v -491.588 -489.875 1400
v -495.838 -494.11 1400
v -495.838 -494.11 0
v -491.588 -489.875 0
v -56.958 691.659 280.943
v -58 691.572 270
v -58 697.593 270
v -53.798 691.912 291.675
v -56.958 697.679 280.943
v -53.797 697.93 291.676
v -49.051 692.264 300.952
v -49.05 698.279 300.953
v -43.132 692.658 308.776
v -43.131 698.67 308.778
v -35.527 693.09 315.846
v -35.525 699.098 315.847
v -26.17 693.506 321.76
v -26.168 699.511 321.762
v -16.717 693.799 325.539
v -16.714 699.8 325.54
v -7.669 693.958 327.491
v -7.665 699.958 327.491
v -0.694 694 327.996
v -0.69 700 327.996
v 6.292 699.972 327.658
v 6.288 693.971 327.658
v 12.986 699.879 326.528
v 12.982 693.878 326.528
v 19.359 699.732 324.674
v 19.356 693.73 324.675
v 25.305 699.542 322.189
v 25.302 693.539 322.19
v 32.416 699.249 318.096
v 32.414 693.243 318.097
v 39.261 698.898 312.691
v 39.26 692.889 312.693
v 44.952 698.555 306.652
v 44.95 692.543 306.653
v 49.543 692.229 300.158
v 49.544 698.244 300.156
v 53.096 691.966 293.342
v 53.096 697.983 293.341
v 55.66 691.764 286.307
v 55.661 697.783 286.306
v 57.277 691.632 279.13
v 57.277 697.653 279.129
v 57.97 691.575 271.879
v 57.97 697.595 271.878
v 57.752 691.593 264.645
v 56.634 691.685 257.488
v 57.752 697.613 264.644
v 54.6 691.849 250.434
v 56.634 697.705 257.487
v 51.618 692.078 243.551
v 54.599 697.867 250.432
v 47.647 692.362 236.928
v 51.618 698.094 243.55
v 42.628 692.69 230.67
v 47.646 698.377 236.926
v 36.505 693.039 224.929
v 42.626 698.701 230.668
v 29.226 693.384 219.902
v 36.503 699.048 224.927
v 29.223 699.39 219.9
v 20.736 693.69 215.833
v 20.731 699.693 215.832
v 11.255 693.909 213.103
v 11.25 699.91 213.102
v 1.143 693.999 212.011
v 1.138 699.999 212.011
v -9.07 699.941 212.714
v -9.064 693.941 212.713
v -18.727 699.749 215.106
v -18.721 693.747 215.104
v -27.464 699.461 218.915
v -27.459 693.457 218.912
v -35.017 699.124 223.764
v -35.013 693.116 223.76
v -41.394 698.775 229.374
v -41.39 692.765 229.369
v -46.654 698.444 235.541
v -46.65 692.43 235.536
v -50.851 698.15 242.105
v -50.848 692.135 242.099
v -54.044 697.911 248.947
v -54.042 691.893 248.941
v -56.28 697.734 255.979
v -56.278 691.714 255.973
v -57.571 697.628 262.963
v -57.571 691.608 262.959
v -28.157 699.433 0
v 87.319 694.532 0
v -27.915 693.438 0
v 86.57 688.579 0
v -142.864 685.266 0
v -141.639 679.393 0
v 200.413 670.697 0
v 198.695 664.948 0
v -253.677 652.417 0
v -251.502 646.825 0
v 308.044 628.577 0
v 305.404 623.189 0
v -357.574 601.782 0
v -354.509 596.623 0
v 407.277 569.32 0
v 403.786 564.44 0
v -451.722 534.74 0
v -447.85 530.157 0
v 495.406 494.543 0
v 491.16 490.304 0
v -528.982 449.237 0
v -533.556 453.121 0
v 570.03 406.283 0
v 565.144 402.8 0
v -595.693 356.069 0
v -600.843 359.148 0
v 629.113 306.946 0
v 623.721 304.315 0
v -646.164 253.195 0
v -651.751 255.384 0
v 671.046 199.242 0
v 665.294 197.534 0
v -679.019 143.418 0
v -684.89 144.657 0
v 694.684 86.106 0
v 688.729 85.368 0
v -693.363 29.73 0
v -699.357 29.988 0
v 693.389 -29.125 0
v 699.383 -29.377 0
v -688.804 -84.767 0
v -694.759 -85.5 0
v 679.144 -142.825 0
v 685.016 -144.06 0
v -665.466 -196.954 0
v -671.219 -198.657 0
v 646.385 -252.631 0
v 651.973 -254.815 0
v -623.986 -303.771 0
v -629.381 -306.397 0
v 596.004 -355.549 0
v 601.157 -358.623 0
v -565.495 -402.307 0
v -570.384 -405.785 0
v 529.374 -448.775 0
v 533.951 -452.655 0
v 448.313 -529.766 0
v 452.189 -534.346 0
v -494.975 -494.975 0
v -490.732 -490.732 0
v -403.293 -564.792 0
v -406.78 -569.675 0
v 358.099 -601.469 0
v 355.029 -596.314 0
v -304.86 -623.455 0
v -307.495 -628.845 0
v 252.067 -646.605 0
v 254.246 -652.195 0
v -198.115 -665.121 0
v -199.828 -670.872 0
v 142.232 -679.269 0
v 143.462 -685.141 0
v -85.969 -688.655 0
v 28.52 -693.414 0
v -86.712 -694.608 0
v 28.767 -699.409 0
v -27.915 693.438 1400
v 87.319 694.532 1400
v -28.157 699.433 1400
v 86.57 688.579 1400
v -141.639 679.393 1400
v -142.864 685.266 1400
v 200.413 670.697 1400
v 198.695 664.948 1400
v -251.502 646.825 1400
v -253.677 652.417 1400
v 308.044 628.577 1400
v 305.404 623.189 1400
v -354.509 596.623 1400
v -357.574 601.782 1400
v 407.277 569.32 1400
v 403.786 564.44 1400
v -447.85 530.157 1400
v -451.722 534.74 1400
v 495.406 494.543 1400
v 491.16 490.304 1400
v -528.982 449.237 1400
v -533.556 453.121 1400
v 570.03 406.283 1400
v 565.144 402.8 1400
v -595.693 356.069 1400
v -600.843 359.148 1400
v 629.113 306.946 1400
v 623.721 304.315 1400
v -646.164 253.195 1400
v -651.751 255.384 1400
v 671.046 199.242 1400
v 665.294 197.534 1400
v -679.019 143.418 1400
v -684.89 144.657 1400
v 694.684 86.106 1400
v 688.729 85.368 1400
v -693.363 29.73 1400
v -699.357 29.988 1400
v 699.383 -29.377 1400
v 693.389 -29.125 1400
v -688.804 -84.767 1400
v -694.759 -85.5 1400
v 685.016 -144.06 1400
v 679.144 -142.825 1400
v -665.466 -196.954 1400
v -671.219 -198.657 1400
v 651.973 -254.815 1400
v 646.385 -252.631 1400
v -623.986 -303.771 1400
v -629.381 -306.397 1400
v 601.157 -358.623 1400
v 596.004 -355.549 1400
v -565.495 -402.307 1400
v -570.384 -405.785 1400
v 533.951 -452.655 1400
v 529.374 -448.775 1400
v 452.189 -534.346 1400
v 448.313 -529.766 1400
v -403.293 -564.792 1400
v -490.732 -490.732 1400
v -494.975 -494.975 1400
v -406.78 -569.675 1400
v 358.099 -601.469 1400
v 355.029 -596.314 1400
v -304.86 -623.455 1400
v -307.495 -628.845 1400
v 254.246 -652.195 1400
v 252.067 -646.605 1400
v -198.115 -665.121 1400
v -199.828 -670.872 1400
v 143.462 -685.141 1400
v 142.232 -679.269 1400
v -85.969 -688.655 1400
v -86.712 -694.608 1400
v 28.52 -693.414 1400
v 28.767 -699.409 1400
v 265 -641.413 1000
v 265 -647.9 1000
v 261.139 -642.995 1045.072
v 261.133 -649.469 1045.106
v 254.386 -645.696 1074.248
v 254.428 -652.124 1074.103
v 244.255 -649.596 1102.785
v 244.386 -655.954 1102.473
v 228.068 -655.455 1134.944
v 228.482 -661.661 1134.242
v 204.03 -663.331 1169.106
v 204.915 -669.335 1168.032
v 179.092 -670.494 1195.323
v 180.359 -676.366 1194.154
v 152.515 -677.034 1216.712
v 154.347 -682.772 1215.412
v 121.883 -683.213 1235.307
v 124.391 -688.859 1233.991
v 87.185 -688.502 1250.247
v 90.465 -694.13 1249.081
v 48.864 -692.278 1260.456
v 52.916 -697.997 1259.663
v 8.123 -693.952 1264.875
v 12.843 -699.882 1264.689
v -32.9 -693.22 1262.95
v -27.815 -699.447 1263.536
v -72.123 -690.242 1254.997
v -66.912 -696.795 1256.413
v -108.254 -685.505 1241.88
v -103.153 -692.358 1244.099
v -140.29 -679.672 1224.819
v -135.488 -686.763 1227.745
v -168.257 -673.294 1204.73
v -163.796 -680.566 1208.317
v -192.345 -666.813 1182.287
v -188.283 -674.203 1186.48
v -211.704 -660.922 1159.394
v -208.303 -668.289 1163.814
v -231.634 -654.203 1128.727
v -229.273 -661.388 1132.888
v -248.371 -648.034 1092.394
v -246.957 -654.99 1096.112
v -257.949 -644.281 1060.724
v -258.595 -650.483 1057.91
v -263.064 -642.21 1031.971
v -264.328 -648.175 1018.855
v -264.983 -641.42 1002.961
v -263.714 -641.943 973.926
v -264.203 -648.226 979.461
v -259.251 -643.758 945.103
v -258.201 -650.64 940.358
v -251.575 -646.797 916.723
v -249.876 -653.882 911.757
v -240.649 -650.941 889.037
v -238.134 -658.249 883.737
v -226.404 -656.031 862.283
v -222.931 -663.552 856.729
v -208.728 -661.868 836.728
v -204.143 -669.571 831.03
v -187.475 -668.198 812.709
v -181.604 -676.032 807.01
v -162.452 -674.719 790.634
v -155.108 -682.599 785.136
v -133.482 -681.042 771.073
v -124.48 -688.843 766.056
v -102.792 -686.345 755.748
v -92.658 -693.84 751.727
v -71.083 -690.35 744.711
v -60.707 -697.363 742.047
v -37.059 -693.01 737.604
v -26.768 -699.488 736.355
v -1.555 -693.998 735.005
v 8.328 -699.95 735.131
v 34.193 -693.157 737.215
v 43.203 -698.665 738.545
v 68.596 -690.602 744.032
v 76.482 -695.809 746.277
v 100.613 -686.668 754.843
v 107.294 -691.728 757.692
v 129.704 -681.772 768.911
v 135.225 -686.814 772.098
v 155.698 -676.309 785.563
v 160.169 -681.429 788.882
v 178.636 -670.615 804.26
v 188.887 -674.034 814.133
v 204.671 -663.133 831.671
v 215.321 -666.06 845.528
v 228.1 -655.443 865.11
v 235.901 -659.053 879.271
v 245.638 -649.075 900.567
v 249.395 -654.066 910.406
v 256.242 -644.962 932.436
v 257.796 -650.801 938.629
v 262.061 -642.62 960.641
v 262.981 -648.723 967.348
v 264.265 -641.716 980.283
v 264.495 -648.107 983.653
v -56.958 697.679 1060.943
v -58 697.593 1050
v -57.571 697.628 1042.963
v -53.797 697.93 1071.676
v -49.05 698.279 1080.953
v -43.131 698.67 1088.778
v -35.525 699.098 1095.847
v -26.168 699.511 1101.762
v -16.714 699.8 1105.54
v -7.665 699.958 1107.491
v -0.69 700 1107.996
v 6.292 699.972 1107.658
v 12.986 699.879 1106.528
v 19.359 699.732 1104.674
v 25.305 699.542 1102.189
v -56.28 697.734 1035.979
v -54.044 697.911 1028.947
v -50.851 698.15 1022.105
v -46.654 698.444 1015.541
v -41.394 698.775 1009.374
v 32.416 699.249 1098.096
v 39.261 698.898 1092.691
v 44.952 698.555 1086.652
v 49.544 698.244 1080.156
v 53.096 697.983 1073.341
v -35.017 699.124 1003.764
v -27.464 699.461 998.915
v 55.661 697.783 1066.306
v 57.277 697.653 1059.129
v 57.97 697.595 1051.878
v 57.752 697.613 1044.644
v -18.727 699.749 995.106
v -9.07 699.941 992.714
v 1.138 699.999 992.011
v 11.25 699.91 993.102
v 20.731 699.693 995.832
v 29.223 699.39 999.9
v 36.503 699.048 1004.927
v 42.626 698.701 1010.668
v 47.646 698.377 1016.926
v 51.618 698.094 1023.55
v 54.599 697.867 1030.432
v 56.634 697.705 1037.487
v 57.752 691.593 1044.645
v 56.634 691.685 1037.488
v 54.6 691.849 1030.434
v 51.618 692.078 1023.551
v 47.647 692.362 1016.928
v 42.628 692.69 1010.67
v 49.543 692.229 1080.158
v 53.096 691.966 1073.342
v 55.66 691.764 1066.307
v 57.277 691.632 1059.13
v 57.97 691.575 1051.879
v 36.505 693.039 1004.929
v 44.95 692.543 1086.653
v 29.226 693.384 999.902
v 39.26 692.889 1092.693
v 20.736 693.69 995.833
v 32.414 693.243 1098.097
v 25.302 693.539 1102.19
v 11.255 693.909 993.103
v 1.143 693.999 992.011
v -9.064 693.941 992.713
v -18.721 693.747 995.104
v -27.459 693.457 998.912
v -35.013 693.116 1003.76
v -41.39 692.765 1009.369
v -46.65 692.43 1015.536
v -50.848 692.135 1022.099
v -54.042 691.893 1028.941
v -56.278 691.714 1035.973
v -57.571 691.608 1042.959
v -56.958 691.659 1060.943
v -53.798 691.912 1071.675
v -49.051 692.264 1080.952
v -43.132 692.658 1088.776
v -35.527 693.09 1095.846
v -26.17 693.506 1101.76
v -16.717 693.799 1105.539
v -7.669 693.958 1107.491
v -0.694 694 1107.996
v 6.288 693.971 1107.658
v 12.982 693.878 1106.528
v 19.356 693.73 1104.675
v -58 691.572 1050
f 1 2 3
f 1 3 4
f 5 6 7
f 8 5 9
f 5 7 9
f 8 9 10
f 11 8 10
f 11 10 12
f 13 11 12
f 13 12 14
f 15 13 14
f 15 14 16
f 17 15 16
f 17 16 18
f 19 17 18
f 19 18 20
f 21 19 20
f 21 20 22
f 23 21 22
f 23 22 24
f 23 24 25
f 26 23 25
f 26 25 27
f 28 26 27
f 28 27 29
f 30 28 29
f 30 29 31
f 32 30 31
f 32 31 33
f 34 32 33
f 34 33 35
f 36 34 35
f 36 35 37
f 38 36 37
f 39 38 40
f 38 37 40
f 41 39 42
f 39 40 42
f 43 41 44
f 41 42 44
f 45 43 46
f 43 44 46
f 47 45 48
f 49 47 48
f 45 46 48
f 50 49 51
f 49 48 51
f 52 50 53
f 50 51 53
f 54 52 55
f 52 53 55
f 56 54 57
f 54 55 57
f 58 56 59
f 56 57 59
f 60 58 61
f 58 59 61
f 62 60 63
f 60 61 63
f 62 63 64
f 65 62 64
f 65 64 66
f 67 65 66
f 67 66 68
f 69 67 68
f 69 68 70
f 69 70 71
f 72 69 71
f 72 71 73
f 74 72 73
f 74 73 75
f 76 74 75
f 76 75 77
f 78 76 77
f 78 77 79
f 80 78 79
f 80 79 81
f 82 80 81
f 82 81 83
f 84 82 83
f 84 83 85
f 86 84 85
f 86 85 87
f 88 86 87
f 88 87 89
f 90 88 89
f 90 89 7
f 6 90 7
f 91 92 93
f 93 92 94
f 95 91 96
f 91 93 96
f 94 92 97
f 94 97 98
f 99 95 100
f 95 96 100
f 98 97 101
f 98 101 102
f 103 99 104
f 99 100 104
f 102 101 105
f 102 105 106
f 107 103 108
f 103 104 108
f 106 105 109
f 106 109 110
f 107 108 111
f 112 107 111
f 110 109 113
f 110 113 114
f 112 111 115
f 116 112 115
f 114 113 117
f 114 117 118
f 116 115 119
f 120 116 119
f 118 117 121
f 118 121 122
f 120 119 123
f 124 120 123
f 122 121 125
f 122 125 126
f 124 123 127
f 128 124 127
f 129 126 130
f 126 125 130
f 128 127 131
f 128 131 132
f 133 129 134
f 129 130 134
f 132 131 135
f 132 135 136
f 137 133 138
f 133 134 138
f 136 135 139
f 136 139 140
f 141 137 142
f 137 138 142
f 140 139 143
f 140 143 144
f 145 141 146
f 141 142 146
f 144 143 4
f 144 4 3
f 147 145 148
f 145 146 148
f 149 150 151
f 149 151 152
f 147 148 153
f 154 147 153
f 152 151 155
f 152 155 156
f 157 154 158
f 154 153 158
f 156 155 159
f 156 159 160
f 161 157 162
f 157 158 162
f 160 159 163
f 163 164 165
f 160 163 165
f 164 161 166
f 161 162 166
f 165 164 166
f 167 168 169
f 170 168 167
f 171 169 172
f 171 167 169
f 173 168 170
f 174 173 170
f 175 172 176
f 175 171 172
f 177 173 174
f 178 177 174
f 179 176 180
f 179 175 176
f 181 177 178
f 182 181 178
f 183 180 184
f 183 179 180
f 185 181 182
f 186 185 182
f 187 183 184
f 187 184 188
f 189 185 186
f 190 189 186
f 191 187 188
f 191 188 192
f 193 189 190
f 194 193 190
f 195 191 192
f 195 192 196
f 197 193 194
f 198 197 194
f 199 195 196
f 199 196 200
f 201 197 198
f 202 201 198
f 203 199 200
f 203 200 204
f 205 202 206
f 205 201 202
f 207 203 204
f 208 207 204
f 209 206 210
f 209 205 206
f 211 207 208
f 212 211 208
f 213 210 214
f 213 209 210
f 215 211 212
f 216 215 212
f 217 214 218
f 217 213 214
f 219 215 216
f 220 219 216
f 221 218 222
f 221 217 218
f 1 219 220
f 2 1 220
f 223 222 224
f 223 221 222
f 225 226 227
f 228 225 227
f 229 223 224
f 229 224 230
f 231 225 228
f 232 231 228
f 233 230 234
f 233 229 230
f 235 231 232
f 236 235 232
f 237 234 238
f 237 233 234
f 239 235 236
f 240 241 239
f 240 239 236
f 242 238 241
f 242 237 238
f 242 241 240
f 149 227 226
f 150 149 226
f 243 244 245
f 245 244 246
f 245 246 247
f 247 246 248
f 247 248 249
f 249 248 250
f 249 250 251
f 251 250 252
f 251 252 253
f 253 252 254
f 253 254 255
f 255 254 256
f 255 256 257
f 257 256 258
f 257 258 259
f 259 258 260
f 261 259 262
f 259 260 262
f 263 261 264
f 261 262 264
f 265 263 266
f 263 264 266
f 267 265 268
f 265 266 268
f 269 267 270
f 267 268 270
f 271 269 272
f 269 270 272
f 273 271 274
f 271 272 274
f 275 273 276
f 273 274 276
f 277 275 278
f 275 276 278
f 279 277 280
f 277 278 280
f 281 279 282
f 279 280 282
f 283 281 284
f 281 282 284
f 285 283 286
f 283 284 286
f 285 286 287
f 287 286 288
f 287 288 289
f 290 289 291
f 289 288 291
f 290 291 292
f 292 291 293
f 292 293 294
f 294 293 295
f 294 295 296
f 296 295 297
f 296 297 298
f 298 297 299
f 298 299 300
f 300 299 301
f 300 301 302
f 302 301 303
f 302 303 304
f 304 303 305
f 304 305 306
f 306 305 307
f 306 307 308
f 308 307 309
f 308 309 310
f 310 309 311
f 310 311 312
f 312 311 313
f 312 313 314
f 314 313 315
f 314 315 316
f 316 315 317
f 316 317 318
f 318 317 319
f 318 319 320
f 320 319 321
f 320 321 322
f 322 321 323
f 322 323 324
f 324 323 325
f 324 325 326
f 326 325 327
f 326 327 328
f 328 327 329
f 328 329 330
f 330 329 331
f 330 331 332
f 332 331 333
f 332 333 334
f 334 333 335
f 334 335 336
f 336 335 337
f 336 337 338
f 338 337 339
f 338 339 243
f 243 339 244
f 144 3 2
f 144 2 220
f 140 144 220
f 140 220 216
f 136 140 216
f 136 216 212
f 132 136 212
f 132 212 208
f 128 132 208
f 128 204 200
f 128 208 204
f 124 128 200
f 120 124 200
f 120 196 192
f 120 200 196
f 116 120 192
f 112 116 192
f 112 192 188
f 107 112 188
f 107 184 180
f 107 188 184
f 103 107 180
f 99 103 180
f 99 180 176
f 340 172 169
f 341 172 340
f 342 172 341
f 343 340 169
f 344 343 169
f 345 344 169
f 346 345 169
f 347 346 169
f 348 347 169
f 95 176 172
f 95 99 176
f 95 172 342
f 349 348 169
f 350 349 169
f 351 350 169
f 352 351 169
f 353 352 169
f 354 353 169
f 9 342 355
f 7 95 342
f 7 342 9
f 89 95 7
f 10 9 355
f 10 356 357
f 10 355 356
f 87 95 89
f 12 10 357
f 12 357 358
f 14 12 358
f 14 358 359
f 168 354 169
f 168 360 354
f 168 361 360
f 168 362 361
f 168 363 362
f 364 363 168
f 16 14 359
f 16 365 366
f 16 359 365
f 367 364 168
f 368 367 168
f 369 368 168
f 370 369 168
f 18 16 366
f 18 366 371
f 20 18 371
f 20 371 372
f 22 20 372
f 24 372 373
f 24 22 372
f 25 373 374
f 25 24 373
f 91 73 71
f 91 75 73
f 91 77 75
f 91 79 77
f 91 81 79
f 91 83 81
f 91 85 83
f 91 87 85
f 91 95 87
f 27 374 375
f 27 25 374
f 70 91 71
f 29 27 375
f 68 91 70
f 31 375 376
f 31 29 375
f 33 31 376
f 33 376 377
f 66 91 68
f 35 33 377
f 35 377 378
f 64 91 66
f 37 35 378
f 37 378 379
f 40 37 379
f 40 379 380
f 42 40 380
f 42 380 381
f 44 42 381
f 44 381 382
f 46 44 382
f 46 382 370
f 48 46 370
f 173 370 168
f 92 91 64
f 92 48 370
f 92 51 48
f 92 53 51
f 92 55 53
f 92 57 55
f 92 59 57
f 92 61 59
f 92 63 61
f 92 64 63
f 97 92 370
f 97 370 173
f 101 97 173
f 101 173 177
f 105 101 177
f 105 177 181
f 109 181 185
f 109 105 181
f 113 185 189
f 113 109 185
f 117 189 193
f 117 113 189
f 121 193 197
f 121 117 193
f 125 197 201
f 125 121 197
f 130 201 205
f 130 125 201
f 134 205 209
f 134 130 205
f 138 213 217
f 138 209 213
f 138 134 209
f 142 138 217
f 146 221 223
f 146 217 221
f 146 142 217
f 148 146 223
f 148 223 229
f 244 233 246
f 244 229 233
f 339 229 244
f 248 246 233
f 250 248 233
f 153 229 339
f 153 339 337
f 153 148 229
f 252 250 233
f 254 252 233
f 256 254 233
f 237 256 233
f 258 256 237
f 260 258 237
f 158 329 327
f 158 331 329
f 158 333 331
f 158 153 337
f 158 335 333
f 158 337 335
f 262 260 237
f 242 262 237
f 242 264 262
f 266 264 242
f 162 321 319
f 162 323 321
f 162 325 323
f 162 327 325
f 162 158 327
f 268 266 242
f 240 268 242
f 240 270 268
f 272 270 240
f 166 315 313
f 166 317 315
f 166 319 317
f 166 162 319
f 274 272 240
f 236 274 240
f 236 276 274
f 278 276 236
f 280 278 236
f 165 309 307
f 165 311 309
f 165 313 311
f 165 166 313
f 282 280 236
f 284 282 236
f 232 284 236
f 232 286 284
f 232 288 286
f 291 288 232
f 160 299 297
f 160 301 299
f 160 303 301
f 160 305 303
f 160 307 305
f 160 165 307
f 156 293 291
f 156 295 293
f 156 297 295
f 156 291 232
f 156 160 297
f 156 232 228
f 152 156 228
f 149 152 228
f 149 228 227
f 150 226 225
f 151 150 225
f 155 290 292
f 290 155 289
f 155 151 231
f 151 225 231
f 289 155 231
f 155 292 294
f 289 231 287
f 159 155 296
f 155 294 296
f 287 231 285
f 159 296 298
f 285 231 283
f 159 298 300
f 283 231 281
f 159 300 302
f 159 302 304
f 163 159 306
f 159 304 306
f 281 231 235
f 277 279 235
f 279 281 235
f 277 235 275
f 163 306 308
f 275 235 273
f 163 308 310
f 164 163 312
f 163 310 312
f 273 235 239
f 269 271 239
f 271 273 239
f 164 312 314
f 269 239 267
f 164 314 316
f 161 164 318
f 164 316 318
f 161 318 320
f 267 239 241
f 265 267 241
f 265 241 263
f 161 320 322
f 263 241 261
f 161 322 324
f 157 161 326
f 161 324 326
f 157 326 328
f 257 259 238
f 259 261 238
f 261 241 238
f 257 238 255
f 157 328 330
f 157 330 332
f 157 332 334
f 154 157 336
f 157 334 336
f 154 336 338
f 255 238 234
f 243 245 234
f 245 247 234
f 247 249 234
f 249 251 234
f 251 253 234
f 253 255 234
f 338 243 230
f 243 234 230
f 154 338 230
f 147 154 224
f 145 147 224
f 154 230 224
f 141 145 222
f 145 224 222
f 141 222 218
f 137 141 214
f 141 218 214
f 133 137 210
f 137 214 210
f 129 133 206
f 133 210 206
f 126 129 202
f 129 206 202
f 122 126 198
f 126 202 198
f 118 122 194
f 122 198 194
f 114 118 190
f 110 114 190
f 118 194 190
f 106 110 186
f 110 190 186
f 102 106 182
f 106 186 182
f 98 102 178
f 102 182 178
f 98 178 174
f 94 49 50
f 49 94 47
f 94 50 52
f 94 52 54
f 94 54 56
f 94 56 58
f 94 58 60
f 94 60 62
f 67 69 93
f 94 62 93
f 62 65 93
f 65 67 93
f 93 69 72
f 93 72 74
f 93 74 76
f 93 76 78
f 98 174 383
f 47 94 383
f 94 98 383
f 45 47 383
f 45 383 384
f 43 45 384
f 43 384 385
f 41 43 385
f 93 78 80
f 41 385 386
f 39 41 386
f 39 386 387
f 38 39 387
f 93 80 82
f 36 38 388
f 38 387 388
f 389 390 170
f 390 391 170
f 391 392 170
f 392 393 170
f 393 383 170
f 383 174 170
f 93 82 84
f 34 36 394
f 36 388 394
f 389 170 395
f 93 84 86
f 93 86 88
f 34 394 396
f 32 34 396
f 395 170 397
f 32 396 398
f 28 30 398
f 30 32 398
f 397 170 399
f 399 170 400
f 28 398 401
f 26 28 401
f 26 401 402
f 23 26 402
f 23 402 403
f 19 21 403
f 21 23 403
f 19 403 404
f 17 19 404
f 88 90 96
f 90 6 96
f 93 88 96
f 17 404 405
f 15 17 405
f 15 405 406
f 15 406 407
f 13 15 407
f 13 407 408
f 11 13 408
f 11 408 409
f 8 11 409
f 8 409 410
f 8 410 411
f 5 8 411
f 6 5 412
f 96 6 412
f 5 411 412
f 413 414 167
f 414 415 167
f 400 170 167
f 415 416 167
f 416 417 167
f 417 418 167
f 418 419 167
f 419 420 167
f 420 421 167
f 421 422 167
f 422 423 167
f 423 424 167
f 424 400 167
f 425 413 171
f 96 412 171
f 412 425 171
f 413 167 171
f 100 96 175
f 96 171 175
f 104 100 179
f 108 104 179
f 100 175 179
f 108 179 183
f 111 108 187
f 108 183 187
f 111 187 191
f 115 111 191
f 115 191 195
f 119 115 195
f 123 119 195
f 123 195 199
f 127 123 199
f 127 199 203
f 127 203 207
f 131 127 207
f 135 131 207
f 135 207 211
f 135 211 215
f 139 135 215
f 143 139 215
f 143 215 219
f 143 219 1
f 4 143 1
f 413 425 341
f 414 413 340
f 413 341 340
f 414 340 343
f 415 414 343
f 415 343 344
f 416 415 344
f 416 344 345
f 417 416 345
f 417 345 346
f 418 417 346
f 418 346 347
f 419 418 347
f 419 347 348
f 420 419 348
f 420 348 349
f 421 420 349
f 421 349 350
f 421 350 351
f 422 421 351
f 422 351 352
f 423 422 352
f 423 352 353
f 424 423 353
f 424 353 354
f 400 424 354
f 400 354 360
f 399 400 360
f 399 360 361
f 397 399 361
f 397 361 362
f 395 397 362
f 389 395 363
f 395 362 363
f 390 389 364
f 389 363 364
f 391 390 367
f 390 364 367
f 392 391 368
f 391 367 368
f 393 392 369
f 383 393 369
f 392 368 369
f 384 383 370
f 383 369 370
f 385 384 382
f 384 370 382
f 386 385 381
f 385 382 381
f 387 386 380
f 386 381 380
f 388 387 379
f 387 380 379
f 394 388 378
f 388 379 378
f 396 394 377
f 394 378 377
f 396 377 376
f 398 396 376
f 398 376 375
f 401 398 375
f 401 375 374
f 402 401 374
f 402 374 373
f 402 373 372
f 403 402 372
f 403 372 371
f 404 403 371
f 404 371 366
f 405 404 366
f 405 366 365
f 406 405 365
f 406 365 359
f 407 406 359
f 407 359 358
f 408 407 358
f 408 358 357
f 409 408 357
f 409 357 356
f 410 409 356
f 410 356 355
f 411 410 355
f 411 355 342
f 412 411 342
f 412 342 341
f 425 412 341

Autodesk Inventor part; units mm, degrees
sketch "floor angle sketch" plane through (0, 0, 0) normal (0, 0, 1) x (1, 0, 0)
  line L0 (0, 0) -> (0, -240.1382) construction
  line L1 (0, 0) -> (0, -1100)
  line L2 (-494.9747, -494.9747) -> (494.9747, 494.9747) construction
  circle A0 centre (0, 0) radius 700 construction
  line L3 (0, 0) -> (0, 900)
  line L4 (57, 900) -> (-57, 900)
  line L5 (-265, -1100) -> (265, -1100)
  line L6 (0, 0) -> (-342.0201, -939.6926)
  line L7 (0, 0) -> (0, 800)
  line L8 (57, 800) -> (-57, 800)
  line L9 (-403.1002, -917.4613) -> (-280.9401, -961.9239)
  dimension "d51" = 1400
  dimension "d52" = 45
  dimension "d54" = 0
  dimension "d55" = 180
  dimension "d56" = 530
  dimension "d58" = 114
  dimension "d59" = 114
  dimension "d60" = 180
  dimension "d61" = 800
  dimension "d62" = 130
  dimension "d63" = 20
  dimension "d64" = 900
  dimension "d65" = 1000
  dimension "d66" = 1100
ref_plane "SHELL Plane" through (-494.9747, -494.9747, 0) normal (0.7071, -0.7071, 0) x (0.7071, 0.7071, 0)
ref_plane "ACCESS Plane" through (-265, -1100, 0) normal (0, -1, 0) x (1, 0, 0)
ref_plane "OUTER Plane" through (57, 900, 0) normal (0, 1, 0) x (-1, 0, 0)
ref_plane "INNER Plane" through (57, 800, 0) normal (0, 1, 0) x (-1, 0, 0)
ref_plane "CHARGE Plane" through (-403.1002, -917.4613, 0) normal (-0.342, -0.9397, 0) x (0.9397, -0.342, 0)
sketch "Sketch13" plane through (-494.9747, -494.9747, 0) normal (0.7071, -0.7071, 0) x (0.7071, 0.7071, 0)
  line L0 (700, 0) -> (700, 892.6829)
  line L1 (0, 0) -> (6, 0)
  line L2 (6, 0) -> (6, 1400)
  line L3 (6, 1400) -> (0, 1400)
  line L4 (0, 1400) -> (0, 0)
  dimension "d75" = 1400
  dimension "d76" = 6
  dimension "d77" = 1400
revolve "Revolution2" add sketch "Sketch13" angle 359.9 about axis through (0, 0, 0) along (0, 0, 1)
sketch "Sketch14" plane through (-265, -1100, 0) normal (0, -1, 0) x (1, 0, 0)
  circle A0 centre (265, 1000) radius 265
  point P0 (265, 0)
  dimension "d79" = 1000
  dimension "d80" = 530
extrude "ACCESS" cut sketch "Sketch14" against normal up to next
sketch "Sketch15" plane through (57, 800, 0) normal (0, 1, 0) x (-1, 0, 0)
  circle A0 centre (57, 270) radius 58
  point P0 (57, 0)
  dimension "d84" = 116
  dimension "d85" = 270
extrude "INNER" cut sketch "Sketch15" against normal up to next
sketch "Sketch16" plane through (57, 900, 0) normal (0, 1, 0) x (-1, 0, 0)
  circle A0 centre (57, 1050) radius 58
  point P0 (57, 0)
  dimension "d88" = 1050
  dimension "d89" = 116
extrude "Extrusion9" cut sketch "Sketch16" against normal up to next
equation "\"BendRadius\" = Thickness"
equation "\"BendReliefWidth\" = Thickness"
equation "\"BendReliefDepth\" = 0.5 * Thickness"
equation "\"CornerReliefSize\" = 4 * Thickness"
equation "\"MinimumRemnant\" = 2 * Thickness"
equation "\"TransitionRadius\" = BendRadius"
equation "\"JacobiRadiusSize\" = BendRadius"
equation "\"GapSize\" = Thickness"
equation "\"Thickness\" = 6"
properties part number "ANP 1402 SHELL D1400" material "Steel"
